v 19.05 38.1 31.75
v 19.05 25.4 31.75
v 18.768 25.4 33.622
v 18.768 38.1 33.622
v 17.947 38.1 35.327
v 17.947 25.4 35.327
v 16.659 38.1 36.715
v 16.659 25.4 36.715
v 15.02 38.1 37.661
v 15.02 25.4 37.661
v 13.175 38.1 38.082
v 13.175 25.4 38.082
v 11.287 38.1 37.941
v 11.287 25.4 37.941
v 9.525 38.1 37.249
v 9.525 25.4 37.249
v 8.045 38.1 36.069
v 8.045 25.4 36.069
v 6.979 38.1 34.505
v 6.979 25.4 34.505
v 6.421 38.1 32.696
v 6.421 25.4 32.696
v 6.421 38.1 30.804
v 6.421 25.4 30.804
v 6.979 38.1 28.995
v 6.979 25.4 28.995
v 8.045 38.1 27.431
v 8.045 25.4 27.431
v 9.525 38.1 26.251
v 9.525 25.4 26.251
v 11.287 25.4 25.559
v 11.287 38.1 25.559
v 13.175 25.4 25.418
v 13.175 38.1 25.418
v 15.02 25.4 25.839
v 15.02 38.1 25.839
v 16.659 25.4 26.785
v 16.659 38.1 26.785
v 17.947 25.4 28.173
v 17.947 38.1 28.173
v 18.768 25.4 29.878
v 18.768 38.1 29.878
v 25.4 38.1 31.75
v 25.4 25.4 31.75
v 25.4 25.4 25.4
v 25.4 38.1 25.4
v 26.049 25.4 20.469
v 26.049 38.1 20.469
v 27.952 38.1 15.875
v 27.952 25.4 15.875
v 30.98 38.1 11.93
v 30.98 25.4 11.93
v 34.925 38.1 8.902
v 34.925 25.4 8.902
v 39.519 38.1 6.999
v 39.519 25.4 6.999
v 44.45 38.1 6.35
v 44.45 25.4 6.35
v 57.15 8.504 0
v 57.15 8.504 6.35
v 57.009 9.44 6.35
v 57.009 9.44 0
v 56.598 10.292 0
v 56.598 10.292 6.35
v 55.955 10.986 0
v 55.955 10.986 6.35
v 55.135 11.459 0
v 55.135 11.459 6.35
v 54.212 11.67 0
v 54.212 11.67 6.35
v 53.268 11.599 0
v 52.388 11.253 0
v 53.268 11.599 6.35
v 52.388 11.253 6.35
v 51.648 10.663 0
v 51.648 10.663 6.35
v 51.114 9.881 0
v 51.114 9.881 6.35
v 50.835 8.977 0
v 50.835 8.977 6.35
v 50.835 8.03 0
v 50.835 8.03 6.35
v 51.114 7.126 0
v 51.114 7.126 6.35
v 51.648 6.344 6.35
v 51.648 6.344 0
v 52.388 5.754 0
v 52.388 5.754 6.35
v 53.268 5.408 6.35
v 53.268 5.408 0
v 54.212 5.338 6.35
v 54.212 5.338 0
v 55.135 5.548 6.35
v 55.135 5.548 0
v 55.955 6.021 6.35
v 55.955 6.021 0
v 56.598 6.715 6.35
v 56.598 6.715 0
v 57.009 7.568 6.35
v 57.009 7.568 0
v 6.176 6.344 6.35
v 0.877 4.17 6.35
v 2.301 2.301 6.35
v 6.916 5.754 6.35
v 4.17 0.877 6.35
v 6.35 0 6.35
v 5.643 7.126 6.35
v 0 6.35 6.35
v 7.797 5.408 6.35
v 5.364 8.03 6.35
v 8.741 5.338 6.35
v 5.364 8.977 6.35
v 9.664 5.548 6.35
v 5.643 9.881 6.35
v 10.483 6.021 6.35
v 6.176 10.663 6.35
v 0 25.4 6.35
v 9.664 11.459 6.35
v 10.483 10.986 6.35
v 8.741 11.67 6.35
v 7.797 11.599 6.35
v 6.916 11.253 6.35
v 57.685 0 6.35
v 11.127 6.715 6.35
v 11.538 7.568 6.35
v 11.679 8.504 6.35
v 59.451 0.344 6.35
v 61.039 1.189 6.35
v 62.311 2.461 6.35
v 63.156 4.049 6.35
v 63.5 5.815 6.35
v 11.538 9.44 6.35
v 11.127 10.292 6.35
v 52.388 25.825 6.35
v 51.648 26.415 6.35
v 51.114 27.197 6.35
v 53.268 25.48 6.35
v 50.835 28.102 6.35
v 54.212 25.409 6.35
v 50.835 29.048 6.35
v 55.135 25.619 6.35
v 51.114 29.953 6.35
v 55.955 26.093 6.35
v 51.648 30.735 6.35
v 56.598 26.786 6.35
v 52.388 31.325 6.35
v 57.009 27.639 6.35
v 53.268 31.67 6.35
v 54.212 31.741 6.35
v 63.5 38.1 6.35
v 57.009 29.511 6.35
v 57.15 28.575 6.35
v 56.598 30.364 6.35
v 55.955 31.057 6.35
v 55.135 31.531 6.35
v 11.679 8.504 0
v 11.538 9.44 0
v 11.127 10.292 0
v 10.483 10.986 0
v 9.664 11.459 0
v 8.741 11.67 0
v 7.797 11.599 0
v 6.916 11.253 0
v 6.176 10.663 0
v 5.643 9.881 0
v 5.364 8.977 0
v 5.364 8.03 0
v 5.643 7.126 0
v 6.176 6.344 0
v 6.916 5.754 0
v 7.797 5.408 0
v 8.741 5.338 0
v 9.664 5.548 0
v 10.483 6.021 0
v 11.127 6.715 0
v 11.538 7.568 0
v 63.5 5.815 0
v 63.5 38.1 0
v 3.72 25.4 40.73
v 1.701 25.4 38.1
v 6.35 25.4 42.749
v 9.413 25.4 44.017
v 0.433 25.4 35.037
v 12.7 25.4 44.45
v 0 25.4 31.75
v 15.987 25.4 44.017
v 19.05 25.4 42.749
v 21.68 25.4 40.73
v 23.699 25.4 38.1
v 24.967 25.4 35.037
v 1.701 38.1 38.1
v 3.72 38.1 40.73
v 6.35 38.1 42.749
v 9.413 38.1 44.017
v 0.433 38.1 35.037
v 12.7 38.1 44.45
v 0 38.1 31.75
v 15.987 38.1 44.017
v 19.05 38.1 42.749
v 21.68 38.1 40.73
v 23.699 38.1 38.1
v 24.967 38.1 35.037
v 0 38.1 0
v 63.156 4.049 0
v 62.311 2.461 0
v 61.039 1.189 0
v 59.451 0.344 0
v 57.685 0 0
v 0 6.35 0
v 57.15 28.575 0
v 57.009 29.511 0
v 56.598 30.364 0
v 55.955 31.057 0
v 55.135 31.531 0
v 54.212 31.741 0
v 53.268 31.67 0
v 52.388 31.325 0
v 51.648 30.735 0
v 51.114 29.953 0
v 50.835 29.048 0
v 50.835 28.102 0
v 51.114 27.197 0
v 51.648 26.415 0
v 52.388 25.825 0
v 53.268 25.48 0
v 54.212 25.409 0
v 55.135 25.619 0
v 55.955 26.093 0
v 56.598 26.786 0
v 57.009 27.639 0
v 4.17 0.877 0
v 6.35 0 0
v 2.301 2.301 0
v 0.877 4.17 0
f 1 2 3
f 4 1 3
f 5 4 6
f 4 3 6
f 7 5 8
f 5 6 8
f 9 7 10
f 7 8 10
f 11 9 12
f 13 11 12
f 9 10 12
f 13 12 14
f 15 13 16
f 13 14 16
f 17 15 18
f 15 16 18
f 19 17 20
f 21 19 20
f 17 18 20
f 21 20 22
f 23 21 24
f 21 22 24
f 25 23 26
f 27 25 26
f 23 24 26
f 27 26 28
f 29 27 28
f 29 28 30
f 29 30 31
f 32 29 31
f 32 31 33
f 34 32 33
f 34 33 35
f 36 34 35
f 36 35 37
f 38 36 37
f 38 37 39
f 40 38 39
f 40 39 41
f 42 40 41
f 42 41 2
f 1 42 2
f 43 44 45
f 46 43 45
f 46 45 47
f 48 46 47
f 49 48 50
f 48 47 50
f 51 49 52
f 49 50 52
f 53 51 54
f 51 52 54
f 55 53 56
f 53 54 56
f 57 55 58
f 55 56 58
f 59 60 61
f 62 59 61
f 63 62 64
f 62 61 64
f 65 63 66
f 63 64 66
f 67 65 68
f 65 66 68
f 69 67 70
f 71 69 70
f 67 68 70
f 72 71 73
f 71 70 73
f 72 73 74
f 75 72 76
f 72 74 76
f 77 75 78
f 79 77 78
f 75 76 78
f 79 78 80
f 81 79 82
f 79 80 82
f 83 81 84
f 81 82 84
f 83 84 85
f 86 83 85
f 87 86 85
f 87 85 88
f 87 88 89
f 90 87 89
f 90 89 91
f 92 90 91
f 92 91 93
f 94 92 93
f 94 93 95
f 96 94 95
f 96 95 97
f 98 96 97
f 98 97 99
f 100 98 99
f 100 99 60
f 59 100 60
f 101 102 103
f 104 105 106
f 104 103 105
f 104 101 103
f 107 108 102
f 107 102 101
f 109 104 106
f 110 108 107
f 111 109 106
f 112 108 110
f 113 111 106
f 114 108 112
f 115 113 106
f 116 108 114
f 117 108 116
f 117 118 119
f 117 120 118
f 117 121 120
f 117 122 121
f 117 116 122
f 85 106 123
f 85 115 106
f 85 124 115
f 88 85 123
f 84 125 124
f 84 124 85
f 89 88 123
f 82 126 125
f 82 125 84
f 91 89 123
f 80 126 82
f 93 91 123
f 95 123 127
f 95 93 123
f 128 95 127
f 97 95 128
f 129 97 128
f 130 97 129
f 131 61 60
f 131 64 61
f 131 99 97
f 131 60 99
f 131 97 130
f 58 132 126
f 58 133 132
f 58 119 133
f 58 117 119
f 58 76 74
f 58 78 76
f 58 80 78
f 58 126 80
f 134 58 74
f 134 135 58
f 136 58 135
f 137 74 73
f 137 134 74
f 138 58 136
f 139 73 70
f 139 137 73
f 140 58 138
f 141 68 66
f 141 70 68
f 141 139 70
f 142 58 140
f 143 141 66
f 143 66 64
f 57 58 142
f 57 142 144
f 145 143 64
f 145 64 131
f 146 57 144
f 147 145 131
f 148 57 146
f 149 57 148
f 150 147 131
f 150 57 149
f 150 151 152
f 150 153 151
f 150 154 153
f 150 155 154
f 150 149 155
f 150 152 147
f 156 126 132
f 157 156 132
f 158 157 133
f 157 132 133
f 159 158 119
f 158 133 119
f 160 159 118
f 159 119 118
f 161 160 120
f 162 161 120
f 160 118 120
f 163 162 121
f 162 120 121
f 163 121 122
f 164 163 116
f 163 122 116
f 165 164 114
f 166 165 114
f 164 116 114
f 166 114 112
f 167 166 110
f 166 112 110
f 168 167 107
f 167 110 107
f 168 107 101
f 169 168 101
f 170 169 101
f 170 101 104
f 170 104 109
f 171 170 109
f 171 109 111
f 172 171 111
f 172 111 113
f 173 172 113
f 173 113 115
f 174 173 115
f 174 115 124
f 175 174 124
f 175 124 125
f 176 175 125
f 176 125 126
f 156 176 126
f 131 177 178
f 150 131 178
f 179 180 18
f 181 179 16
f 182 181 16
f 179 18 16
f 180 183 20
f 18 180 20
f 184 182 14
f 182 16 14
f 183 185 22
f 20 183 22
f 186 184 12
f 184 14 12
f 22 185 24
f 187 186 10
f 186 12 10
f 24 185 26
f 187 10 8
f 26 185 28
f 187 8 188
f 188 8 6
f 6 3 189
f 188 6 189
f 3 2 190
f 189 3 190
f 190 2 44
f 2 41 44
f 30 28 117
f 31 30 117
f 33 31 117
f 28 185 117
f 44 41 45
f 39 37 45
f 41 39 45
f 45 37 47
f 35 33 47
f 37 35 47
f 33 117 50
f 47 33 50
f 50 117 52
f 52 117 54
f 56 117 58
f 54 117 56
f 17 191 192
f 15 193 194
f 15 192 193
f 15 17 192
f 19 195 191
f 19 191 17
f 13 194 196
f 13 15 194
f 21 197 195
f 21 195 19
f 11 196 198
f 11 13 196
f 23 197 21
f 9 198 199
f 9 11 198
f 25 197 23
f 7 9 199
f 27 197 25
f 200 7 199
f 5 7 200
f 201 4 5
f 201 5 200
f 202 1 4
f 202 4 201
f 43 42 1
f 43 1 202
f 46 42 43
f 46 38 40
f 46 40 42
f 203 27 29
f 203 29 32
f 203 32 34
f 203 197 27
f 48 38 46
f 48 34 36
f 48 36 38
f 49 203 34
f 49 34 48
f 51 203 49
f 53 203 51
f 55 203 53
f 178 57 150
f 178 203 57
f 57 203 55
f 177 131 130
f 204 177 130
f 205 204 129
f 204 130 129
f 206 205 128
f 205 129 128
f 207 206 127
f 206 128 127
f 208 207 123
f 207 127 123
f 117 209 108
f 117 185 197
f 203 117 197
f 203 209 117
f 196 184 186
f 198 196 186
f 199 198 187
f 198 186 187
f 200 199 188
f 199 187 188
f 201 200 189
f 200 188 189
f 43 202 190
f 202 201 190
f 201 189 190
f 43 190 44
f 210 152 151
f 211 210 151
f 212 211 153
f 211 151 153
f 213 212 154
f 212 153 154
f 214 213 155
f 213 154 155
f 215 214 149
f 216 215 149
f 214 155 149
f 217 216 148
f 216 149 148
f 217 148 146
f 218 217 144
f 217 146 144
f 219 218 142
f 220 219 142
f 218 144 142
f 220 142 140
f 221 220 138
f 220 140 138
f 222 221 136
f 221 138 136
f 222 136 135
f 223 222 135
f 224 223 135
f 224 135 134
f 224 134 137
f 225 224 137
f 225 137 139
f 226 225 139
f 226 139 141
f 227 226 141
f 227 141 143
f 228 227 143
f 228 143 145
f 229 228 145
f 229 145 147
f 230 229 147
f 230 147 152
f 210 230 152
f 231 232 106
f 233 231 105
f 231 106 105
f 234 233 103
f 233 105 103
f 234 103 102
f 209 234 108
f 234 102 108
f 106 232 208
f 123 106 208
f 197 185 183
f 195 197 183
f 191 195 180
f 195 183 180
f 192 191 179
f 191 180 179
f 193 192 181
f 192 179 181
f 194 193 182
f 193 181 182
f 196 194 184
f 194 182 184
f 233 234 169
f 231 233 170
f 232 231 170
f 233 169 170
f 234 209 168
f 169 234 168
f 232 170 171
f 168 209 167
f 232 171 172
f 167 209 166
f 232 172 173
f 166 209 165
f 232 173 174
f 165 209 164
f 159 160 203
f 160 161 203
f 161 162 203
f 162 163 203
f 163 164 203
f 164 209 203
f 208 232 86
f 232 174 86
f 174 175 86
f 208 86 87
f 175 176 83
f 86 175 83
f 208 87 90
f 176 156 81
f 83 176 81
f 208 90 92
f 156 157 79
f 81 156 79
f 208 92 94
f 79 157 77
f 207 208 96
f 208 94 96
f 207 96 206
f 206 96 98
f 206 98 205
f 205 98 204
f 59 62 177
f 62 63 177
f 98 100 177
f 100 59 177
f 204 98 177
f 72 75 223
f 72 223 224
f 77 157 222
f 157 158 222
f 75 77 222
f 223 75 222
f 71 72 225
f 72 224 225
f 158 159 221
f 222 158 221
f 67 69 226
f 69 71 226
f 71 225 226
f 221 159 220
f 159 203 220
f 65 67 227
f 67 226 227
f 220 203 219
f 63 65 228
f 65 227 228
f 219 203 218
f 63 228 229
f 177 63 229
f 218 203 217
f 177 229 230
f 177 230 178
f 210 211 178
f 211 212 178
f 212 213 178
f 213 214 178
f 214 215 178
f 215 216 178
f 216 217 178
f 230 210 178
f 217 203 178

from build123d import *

# Parameters (mm, degrees)
F0_W      = 63.5
F0_H      = 38.1
F1_DEPTH  = 6.35
F2_W      = 44.45
F2_H      = 12.7
F3_DEPTH  = 38.1
F4_R      = 6.35
F5_DEPTH  = 25.4
F7_DEPTH  = 25.4
F10_DEPTH = 25.4
F12_DEPTH = 25.4
F13_R     = 3.175
F14_DEPTH = 25.4
F15_DEPTH = 25.4


# Not quite as in the source:
# - a feature names something its author has since deleted; it is built from what else it names


with BuildPart() as f1:
    # F0 (on Top) → F1 (new body)
    with BuildSketch(Plane.XY):
        with Locations((31.75, 19.05)):
            Rectangle(F0_W, F0_H)
    extrude(amount=F1_DEPTH)

    # F2 (on face) → F3 (join)
    with BuildSketch(Plane.XY.offset(6.35)):
        with Locations((22.225, 31.75)):
            Rectangle(F2_W, F2_H)
    extrude(amount=F3_DEPTH)

    # F4 (on face) → F5 (cut)
    with BuildSketch(Plane.XZ.offset(-25.4)):
        with Locations((12.7, 31.75)):
            Circle(F4_R)
    extrude(amount=-F5_DEPTH, mode=Mode.SUBTRACT)

    # F6 (on face) → F7 (cut)
    with BuildSketch(Plane.XZ.offset(-25.4)):
        with BuildLine():
            ThreePointArc((0, 31.7500000601), (3.7197439043, 40.7302561464), (12.7000000115, 44.45))
            Line((12.7000000115, 44.45), (0, 44.45))
            Line((0, 44.45), (0, 31.7500000601))
        make_face()
    extrude(amount=-F7_DEPTH, mode=Mode.SUBTRACT)

    # F9 (on face) → F10 (cut)
    with BuildSketch(Plane.XY.offset(6.35)):
        with BuildLine():
            ThreePointArc((6.35, 0), (2.3008253722, 2.3008253722), (0, 6.35))
            Line((0, 6.35), (0, 0))
            Line((0, 0), (6.35, 0))
        make_face()
    extrude(amount=-F10_DEPTH, mode=Mode.SUBTRACT)

    # F11 (on face) → F12 (cut)
    with BuildSketch(Plane.XY.offset(6.35)):
        with BuildLine():
            ThreePointArc((63.5, 5.8150525234), (61.7226257638, 1.7773742362), (57.6849474766, 0))
            Line((57.6849474766, 0), (63.5, 0))
            Line((63.5, 0), (63.5, 5.8150525234))
        make_face()
    extrude(amount=-F12_DEPTH, mode=Mode.SUBTRACT)

    # F13 (on face) → F14 (cut)
    with BuildSketch(Plane.XY.offset(6.35)):
        with Locations((53.975, 28.575)):
            Circle(F13_R)
        with Locations((53.975, 8.5037086033)):
            Circle(F13_R)
        with Locations((8.5037086033, 8.5037086033)):
            Circle(F13_R)
    extrude(amount=-F14_DEPTH, mode=Mode.SUBTRACT)

    # F8 (on face) → F15 (cut)
    with BuildSketch(Plane.XZ.offset(-25.4)):
        with BuildLine():
            ThreePointArc((12.7000000115, 44.45), (21.6802561251, 40.730256117), (25.4, 31.75))
            Line((25.4, 31.75), (25.4, 25.4))
            ThreePointArc((25.4, 25.4), (30.9796158184, 11.9296158184), (44.45, 6.35))
            Line((44.45, 6.35), (44.45, 44.45))
            Line((44.45, 44.45), (12.7000000115, 44.45))
        make_face()
    extrude(amount=-F15_DEPTH, mode=Mode.SUBTRACT)


solid = f1.part
